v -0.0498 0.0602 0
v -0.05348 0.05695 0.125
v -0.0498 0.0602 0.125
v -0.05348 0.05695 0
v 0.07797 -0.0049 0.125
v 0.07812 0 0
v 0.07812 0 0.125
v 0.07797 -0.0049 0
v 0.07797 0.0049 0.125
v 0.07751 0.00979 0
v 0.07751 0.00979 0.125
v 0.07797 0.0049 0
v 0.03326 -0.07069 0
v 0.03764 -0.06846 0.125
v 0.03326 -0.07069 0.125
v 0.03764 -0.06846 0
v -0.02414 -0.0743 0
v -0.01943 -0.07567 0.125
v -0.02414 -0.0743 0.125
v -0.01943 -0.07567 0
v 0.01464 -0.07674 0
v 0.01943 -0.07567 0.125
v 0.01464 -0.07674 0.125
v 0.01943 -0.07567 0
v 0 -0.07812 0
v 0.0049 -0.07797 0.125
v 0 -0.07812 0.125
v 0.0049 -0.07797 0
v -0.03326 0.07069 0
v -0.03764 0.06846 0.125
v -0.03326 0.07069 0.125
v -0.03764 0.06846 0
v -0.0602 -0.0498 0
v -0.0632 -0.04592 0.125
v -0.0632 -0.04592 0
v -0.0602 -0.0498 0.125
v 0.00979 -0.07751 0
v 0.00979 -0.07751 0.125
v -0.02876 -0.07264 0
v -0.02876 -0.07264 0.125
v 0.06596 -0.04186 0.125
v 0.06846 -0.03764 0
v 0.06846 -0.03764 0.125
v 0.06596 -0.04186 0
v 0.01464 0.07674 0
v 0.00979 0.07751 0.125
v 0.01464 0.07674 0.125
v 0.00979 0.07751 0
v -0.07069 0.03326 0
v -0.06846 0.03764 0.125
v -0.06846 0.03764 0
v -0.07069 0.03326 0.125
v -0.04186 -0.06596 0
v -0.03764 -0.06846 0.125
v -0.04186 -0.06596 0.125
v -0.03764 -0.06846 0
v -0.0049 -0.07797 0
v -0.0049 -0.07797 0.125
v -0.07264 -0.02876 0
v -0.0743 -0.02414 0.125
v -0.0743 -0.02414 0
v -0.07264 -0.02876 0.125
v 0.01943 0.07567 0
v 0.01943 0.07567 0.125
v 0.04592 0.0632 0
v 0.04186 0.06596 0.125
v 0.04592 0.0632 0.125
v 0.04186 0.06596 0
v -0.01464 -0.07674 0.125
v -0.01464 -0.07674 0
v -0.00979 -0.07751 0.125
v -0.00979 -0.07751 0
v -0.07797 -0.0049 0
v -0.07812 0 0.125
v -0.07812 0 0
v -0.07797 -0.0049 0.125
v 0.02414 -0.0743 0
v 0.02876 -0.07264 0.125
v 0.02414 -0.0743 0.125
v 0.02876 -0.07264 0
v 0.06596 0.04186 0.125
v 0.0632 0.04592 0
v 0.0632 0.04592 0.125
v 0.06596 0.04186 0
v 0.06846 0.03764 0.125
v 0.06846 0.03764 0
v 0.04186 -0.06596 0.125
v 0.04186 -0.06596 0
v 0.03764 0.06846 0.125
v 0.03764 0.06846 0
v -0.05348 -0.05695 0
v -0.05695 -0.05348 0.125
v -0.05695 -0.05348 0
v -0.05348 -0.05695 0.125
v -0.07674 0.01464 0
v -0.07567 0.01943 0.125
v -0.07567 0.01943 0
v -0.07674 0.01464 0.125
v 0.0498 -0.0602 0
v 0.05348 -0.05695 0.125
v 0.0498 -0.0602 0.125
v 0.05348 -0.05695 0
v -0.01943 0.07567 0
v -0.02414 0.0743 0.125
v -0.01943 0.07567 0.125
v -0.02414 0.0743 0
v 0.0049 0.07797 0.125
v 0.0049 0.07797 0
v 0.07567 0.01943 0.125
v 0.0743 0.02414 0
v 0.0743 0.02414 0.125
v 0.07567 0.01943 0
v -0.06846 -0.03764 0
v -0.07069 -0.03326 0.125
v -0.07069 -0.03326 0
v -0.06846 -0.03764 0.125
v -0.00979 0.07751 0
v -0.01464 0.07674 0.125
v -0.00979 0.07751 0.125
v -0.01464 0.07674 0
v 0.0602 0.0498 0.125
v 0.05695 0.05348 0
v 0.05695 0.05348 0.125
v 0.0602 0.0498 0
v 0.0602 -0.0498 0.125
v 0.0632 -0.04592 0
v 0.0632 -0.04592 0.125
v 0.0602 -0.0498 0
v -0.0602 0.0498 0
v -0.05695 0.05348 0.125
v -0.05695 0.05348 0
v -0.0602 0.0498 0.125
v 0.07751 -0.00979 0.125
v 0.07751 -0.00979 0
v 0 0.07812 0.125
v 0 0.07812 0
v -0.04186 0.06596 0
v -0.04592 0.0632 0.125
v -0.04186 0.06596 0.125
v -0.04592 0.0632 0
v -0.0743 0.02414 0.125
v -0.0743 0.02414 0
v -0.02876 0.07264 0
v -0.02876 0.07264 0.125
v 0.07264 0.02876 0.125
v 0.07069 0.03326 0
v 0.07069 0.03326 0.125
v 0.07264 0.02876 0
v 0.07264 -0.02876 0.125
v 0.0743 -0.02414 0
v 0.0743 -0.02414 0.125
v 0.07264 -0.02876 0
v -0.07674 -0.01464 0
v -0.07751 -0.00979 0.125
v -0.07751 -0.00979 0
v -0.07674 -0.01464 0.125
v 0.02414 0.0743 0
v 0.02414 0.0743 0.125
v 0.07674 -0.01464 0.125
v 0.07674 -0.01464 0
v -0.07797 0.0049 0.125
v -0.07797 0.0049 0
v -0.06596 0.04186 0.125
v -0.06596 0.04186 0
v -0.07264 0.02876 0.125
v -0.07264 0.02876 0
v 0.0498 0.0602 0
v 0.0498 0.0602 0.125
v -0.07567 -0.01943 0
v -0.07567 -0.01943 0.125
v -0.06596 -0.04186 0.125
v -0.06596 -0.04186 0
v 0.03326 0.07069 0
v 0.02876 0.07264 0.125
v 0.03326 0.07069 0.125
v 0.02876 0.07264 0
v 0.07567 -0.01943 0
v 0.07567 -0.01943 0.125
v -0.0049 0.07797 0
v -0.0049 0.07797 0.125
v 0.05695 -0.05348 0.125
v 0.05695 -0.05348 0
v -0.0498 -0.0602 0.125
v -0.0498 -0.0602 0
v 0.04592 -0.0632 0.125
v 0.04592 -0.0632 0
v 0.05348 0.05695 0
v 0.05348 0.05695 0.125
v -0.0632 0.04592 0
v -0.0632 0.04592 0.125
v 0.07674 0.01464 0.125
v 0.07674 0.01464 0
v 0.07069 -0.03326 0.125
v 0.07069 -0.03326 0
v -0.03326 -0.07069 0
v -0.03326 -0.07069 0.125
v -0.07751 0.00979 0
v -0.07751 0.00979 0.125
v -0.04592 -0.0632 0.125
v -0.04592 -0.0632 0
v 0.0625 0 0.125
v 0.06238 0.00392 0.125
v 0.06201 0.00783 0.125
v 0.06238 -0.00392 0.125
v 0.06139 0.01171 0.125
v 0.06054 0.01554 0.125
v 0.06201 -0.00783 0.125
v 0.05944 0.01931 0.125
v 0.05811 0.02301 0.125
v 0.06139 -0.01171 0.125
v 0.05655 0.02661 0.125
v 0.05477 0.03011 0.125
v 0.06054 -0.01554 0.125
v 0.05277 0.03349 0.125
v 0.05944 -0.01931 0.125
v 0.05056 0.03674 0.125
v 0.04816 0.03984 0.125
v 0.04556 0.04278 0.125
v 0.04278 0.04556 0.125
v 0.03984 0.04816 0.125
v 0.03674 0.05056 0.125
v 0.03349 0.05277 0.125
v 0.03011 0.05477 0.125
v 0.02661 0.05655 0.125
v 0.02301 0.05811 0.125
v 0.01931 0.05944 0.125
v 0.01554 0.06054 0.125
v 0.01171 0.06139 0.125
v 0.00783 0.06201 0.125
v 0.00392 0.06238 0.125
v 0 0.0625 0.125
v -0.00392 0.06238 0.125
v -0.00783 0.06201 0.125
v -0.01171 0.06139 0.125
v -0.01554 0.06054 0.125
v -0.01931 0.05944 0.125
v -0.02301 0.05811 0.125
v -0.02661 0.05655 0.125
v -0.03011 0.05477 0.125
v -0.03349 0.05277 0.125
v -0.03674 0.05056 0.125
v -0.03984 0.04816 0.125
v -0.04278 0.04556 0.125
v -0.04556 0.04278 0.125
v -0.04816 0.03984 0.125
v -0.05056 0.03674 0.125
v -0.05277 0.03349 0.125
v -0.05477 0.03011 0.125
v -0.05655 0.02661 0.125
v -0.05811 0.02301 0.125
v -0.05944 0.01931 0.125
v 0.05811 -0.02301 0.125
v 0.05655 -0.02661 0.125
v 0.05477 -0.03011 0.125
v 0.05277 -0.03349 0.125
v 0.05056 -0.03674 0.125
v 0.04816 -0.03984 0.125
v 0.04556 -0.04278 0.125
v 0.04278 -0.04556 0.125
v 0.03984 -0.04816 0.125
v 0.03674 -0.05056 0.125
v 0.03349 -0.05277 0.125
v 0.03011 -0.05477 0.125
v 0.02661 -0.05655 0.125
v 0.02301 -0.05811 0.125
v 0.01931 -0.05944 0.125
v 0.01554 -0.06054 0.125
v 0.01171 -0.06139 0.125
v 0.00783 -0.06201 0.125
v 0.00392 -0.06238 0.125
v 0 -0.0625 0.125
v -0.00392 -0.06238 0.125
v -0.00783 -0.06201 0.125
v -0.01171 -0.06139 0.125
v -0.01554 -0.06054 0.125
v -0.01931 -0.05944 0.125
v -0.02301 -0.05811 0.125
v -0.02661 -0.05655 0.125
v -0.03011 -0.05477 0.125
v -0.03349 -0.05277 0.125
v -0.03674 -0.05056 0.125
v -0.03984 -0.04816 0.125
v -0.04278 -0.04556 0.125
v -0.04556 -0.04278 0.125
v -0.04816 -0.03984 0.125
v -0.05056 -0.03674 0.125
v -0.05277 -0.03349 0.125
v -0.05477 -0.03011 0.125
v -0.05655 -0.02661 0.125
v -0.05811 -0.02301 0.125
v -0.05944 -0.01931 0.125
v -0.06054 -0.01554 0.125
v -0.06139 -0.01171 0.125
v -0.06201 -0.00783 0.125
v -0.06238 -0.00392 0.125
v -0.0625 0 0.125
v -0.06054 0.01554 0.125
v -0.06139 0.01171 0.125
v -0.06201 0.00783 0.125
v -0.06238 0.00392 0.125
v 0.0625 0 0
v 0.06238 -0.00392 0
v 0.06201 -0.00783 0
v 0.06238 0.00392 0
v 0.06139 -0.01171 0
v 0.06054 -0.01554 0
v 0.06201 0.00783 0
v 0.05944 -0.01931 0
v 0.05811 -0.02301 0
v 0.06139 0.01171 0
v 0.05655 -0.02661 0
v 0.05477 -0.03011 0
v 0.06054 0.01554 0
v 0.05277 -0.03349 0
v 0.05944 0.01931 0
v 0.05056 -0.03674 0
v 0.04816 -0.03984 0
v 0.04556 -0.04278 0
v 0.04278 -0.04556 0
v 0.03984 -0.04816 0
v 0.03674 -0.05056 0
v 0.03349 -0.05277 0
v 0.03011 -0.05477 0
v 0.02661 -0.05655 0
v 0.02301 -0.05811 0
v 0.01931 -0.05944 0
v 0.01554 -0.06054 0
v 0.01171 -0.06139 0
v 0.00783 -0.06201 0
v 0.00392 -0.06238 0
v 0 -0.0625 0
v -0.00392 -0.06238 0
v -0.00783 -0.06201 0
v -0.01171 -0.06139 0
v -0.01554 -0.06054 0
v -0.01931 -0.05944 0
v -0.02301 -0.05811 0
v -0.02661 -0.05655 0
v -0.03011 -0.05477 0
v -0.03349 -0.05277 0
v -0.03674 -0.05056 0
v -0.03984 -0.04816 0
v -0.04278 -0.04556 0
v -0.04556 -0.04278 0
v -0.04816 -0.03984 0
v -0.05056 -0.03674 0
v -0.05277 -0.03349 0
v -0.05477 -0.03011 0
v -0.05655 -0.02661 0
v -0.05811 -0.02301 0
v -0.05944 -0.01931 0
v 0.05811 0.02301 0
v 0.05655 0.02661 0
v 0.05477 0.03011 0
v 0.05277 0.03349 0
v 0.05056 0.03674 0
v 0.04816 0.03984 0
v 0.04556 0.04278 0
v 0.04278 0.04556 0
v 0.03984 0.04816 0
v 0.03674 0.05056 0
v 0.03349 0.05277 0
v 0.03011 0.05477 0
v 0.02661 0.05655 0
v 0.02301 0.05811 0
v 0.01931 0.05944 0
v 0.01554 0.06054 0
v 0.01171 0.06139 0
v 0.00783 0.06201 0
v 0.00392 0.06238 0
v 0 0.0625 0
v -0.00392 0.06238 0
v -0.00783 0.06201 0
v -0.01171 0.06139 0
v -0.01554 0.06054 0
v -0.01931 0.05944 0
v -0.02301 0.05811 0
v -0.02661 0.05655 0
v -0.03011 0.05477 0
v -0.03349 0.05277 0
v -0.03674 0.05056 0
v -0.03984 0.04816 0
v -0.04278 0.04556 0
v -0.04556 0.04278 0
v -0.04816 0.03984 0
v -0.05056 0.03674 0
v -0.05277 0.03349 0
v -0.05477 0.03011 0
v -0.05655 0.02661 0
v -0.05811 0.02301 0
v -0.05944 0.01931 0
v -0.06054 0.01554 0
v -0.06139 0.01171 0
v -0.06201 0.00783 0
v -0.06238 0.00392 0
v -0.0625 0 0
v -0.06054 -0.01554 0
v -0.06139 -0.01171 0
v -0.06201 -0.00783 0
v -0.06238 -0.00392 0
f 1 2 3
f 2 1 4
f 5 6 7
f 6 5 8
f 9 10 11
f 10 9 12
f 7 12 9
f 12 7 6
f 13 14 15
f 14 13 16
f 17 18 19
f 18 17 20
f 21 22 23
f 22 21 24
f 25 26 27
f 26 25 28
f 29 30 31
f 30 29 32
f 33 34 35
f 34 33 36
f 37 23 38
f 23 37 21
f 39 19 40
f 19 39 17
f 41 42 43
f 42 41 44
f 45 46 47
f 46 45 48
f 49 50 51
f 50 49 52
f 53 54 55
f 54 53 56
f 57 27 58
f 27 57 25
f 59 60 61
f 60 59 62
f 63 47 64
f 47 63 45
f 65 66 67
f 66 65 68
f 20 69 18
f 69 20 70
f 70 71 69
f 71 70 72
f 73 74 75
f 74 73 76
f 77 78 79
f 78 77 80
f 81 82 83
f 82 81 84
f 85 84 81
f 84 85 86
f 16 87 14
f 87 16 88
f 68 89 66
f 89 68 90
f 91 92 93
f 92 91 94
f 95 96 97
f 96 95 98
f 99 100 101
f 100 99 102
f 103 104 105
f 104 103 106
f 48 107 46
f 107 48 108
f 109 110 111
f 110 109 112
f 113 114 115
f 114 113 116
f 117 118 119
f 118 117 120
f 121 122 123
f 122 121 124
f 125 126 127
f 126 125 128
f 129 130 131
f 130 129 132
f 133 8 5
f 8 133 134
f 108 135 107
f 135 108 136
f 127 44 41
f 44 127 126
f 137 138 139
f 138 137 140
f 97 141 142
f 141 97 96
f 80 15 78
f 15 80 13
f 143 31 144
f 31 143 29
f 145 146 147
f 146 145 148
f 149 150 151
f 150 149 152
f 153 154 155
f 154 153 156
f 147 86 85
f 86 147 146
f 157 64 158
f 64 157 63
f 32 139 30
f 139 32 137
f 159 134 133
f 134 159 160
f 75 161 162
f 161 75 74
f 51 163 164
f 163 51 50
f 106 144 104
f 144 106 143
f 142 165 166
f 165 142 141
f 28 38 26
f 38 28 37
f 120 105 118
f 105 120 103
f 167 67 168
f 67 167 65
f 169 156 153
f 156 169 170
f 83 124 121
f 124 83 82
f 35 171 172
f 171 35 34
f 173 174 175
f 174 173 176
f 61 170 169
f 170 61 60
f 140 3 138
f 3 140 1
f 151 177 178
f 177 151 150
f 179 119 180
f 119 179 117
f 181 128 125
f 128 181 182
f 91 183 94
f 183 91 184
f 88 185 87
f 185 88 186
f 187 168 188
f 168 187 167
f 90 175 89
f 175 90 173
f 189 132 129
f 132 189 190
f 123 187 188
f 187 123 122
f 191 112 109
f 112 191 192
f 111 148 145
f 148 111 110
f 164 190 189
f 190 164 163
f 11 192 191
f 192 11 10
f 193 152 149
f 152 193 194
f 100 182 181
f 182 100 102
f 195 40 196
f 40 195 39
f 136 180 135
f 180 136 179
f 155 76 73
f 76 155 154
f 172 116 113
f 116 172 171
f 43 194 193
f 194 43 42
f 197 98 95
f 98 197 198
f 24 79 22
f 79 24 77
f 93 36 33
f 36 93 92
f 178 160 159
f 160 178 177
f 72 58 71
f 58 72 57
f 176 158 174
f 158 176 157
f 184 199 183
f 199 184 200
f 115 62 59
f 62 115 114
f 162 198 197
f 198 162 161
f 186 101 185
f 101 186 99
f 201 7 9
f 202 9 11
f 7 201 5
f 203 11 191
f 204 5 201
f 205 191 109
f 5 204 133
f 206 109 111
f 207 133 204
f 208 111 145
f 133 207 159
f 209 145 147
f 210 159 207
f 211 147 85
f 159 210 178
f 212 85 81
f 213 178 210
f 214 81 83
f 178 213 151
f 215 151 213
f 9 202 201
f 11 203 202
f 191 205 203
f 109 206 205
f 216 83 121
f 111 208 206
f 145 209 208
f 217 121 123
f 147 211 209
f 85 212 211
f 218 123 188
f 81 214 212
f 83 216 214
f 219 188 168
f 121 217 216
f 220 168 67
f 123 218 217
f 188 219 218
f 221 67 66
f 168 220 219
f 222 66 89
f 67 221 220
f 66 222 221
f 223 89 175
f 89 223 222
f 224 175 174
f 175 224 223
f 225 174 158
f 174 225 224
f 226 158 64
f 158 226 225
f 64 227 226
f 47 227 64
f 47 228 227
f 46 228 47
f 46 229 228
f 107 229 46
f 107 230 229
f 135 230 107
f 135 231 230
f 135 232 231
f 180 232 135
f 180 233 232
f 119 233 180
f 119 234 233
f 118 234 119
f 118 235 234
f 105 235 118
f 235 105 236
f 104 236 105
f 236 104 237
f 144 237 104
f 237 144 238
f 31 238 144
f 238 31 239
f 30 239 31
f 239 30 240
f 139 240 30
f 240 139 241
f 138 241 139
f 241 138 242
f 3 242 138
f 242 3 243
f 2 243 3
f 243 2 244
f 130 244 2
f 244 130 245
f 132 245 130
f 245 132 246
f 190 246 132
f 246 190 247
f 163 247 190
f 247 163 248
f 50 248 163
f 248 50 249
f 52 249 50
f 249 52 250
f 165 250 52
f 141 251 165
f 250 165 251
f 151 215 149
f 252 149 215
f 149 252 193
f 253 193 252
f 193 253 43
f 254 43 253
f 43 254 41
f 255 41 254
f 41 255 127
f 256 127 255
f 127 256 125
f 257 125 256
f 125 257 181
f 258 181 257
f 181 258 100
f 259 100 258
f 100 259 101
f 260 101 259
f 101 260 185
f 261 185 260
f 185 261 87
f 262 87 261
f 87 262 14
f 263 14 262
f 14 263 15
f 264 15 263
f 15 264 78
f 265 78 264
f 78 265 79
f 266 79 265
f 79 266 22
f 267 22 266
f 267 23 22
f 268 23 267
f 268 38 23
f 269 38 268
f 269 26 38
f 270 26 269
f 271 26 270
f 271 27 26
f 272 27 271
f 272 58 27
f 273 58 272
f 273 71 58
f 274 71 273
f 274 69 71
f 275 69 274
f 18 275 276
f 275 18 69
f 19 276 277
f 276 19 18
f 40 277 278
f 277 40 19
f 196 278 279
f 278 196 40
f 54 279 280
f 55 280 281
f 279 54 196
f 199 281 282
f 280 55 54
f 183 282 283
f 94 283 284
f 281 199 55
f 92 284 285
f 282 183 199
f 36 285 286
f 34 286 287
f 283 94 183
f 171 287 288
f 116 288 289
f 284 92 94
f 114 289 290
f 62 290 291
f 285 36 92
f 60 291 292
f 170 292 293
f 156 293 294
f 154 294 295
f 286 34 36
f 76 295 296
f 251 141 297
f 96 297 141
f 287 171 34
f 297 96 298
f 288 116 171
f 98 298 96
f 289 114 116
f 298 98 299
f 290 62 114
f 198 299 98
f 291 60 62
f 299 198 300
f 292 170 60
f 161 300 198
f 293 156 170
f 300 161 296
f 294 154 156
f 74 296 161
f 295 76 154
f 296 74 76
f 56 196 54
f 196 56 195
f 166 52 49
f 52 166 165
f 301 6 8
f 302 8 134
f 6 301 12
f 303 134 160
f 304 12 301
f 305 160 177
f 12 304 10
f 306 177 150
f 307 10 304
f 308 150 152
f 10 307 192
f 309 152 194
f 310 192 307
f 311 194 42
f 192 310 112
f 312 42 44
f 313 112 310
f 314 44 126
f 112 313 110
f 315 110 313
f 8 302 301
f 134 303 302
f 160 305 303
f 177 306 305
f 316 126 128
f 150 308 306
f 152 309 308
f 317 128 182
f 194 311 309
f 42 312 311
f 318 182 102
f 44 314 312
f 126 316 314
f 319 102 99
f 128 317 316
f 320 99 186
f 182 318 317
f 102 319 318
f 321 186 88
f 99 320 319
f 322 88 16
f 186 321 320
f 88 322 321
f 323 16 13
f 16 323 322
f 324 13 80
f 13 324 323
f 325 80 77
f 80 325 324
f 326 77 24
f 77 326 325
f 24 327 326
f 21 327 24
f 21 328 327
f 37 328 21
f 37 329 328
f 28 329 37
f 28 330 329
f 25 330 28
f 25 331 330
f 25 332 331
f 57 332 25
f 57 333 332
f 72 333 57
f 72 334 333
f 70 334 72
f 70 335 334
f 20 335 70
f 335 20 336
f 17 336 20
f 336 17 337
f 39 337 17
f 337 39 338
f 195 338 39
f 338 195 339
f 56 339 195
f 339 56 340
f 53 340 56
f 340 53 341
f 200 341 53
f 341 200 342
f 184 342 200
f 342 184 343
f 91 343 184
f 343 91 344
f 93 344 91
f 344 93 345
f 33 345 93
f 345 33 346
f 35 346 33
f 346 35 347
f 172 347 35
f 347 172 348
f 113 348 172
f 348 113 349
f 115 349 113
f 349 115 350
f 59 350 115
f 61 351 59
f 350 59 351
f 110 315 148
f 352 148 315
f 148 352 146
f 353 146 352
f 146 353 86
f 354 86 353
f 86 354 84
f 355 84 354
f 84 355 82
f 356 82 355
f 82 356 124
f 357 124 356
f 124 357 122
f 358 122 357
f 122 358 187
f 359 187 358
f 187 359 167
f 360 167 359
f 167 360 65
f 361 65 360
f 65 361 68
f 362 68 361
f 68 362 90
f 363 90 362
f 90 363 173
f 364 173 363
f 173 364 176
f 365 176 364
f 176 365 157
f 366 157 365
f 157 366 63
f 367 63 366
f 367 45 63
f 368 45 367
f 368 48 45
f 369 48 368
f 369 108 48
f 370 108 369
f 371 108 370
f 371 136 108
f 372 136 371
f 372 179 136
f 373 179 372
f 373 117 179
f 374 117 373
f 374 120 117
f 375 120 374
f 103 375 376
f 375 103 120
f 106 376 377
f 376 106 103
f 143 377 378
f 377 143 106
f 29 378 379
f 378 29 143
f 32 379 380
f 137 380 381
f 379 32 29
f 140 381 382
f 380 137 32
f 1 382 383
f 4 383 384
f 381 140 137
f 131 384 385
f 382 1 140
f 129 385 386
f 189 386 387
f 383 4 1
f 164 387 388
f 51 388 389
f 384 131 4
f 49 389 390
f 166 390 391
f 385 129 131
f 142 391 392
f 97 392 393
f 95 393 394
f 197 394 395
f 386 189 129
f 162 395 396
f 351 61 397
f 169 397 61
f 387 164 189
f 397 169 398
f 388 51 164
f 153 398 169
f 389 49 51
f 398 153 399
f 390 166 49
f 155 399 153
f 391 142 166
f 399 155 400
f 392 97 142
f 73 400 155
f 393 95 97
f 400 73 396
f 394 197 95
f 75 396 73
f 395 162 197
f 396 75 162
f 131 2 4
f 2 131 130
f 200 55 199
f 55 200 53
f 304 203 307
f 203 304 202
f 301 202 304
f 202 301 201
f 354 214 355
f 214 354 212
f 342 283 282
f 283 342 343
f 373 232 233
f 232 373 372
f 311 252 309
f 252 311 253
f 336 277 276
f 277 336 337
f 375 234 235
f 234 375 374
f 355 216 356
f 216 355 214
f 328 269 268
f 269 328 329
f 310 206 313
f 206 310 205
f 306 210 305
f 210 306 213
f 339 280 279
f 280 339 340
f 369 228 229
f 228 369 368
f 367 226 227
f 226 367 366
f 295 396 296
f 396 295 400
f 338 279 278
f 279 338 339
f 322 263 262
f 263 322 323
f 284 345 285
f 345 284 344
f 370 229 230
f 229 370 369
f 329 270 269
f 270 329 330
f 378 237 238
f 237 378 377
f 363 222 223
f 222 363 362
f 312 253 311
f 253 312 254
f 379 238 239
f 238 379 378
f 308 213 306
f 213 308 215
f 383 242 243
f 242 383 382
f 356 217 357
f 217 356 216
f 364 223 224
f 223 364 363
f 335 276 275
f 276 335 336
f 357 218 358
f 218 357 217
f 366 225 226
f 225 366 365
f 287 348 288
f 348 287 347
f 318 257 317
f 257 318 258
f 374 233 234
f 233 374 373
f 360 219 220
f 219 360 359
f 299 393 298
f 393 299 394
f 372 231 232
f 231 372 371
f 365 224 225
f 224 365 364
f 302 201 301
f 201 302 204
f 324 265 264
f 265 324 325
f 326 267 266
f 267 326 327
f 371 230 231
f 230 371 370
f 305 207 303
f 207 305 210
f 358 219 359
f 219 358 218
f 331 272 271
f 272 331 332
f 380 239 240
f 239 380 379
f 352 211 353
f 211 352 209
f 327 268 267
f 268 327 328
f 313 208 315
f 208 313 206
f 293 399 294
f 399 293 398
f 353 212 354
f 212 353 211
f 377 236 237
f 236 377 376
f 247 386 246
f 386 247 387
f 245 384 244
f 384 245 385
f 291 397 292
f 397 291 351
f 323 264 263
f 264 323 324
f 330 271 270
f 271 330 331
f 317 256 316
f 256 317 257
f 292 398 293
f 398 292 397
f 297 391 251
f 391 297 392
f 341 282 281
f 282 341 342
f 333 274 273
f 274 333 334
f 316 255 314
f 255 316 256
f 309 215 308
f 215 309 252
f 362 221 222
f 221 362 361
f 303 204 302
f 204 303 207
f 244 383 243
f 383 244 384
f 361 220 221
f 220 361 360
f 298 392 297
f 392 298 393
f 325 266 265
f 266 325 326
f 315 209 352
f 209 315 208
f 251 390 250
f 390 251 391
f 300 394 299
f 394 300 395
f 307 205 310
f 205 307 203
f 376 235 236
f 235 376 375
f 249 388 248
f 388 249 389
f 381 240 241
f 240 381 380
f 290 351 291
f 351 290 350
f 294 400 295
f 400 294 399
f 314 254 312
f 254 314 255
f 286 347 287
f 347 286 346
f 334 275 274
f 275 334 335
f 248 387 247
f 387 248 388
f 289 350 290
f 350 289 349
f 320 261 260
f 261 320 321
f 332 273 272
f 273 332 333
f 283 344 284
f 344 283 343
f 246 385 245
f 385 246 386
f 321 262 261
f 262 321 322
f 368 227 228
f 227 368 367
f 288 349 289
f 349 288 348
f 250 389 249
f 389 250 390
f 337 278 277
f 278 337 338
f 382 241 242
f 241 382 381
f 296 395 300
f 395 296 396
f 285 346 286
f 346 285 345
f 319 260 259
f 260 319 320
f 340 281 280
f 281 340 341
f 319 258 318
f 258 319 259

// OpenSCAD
// file: MMlib/paper_tube.scad
//################################################################
// paper tube.scad - creates simple hollow cylinder
// (c) 2021 - Roie R. Black
// docs: https://rblack.github.io/math-magik/magik/paper_tube.html

$fn = 100;

module paper_tube(r=1, h=2, t=0.25) {
  th = 3 * h;
  difference() {
    cylinder(r=r+t,h=h);
    translate([0,0,-h])
      cylinder(r=r, h=th);
  }
}

paper_tube();
// file: ../../materials.scad
//###########################################
// materials.scad
// (c) 2021 - Roie R. Black
//*******************************************

tube_thickness = 1/64;
tube_height = 1/8;
post_diameter = 1/16;
// main file
//#################################################
// paper_tube.scad
// (c) 2021 Roie R. Black
//=================================================
include <../../materials.scad>
use <MMlib/paper_tube.scad>

module wing_mount() {
  color("Yellow")
	  paper_tube(post_diameter,tube_height,tube_thickness);
}

wing_mount();
